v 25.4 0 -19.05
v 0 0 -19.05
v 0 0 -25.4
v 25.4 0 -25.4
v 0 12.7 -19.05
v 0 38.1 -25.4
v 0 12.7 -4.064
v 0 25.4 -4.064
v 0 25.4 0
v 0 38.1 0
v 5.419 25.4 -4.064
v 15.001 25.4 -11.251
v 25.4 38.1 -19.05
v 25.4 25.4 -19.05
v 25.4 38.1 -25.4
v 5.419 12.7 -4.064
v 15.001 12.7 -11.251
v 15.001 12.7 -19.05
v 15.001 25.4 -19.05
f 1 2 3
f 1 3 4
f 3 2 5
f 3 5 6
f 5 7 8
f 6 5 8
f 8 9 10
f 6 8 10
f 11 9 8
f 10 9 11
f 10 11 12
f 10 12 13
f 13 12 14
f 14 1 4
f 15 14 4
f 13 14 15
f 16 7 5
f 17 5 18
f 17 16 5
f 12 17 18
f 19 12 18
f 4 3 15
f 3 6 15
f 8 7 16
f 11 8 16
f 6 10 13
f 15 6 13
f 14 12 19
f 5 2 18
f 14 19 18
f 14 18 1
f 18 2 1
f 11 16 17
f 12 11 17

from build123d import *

# Parameters (mm, degrees)
F0_W      = 25.4
F0_H      = 38.1
F1_DEPTH  = 25.4
F2_W      = 25.4
F2_H      = 19.05
F3_DEPTH  = 12.7
F5_DEPTH  = 25.4
F6_W      = 25.4
F6_H      = 12.7
F7_DEPTH  = 25.4
F8_W      = 6.35
F8_H      = 4.064
F9_DEPTH  = 25.4
F11_DEPTH = 25.4


with BuildPart() as f1:
    # F0 (on Top) → F1 (new body)
    with BuildSketch(Plane.XY):
        with Locations((12.7, 19.05)):
            Rectangle(F0_W, F0_H)
    extrude(amount=-F1_DEPTH)

    # F2 (on Front) → F3 (cut)
    with BuildSketch(Plane.XZ):
        with Locations((12.7, -9.525)):
            Rectangle(F2_W, F2_H)
    extrude(amount=-F3_DEPTH, mode=Mode.SUBTRACT)

    # F4 (on face) → F5 (cut)
    with BuildSketch(Plane.XZ.offset(-12.7)):
        Polygon((25.4, 0), (0, 0), (25.4, -19.05), align=None)
    extrude(amount=-F5_DEPTH, mode=Mode.SUBTRACT)

    # F6 (on Top) → F7 (join)
    with BuildSketch(Plane.XY):
        with Locations((12.7, 19.05)):
            Rectangle(F6_W, F6_H)
    extrude(amount=-F7_DEPTH)

    # F8 (on Front) → F9 (cut)
    with BuildSketch(Plane.XZ):
        with Locations((3.175, -2.032)):
            Rectangle(F8_W, F8_H)
    extrude(amount=-F9_DEPTH, mode=Mode.SUBTRACT)

    # F10 (on Front) → F11 (cut)
    with BuildSketch(Plane.XZ):
        Polygon((15.000969, 0), (15.000969, -11.250727), (15.000969, -19.05), (27.700969, -19.05), (27.700969, 0), align=None)
        Polygon((15.000969, 0), (0, 0), (15.000969, -11.250727), align=None)
    extrude(amount=-F11_DEPTH, mode=Mode.SUBTRACT)


solid = f1.part
